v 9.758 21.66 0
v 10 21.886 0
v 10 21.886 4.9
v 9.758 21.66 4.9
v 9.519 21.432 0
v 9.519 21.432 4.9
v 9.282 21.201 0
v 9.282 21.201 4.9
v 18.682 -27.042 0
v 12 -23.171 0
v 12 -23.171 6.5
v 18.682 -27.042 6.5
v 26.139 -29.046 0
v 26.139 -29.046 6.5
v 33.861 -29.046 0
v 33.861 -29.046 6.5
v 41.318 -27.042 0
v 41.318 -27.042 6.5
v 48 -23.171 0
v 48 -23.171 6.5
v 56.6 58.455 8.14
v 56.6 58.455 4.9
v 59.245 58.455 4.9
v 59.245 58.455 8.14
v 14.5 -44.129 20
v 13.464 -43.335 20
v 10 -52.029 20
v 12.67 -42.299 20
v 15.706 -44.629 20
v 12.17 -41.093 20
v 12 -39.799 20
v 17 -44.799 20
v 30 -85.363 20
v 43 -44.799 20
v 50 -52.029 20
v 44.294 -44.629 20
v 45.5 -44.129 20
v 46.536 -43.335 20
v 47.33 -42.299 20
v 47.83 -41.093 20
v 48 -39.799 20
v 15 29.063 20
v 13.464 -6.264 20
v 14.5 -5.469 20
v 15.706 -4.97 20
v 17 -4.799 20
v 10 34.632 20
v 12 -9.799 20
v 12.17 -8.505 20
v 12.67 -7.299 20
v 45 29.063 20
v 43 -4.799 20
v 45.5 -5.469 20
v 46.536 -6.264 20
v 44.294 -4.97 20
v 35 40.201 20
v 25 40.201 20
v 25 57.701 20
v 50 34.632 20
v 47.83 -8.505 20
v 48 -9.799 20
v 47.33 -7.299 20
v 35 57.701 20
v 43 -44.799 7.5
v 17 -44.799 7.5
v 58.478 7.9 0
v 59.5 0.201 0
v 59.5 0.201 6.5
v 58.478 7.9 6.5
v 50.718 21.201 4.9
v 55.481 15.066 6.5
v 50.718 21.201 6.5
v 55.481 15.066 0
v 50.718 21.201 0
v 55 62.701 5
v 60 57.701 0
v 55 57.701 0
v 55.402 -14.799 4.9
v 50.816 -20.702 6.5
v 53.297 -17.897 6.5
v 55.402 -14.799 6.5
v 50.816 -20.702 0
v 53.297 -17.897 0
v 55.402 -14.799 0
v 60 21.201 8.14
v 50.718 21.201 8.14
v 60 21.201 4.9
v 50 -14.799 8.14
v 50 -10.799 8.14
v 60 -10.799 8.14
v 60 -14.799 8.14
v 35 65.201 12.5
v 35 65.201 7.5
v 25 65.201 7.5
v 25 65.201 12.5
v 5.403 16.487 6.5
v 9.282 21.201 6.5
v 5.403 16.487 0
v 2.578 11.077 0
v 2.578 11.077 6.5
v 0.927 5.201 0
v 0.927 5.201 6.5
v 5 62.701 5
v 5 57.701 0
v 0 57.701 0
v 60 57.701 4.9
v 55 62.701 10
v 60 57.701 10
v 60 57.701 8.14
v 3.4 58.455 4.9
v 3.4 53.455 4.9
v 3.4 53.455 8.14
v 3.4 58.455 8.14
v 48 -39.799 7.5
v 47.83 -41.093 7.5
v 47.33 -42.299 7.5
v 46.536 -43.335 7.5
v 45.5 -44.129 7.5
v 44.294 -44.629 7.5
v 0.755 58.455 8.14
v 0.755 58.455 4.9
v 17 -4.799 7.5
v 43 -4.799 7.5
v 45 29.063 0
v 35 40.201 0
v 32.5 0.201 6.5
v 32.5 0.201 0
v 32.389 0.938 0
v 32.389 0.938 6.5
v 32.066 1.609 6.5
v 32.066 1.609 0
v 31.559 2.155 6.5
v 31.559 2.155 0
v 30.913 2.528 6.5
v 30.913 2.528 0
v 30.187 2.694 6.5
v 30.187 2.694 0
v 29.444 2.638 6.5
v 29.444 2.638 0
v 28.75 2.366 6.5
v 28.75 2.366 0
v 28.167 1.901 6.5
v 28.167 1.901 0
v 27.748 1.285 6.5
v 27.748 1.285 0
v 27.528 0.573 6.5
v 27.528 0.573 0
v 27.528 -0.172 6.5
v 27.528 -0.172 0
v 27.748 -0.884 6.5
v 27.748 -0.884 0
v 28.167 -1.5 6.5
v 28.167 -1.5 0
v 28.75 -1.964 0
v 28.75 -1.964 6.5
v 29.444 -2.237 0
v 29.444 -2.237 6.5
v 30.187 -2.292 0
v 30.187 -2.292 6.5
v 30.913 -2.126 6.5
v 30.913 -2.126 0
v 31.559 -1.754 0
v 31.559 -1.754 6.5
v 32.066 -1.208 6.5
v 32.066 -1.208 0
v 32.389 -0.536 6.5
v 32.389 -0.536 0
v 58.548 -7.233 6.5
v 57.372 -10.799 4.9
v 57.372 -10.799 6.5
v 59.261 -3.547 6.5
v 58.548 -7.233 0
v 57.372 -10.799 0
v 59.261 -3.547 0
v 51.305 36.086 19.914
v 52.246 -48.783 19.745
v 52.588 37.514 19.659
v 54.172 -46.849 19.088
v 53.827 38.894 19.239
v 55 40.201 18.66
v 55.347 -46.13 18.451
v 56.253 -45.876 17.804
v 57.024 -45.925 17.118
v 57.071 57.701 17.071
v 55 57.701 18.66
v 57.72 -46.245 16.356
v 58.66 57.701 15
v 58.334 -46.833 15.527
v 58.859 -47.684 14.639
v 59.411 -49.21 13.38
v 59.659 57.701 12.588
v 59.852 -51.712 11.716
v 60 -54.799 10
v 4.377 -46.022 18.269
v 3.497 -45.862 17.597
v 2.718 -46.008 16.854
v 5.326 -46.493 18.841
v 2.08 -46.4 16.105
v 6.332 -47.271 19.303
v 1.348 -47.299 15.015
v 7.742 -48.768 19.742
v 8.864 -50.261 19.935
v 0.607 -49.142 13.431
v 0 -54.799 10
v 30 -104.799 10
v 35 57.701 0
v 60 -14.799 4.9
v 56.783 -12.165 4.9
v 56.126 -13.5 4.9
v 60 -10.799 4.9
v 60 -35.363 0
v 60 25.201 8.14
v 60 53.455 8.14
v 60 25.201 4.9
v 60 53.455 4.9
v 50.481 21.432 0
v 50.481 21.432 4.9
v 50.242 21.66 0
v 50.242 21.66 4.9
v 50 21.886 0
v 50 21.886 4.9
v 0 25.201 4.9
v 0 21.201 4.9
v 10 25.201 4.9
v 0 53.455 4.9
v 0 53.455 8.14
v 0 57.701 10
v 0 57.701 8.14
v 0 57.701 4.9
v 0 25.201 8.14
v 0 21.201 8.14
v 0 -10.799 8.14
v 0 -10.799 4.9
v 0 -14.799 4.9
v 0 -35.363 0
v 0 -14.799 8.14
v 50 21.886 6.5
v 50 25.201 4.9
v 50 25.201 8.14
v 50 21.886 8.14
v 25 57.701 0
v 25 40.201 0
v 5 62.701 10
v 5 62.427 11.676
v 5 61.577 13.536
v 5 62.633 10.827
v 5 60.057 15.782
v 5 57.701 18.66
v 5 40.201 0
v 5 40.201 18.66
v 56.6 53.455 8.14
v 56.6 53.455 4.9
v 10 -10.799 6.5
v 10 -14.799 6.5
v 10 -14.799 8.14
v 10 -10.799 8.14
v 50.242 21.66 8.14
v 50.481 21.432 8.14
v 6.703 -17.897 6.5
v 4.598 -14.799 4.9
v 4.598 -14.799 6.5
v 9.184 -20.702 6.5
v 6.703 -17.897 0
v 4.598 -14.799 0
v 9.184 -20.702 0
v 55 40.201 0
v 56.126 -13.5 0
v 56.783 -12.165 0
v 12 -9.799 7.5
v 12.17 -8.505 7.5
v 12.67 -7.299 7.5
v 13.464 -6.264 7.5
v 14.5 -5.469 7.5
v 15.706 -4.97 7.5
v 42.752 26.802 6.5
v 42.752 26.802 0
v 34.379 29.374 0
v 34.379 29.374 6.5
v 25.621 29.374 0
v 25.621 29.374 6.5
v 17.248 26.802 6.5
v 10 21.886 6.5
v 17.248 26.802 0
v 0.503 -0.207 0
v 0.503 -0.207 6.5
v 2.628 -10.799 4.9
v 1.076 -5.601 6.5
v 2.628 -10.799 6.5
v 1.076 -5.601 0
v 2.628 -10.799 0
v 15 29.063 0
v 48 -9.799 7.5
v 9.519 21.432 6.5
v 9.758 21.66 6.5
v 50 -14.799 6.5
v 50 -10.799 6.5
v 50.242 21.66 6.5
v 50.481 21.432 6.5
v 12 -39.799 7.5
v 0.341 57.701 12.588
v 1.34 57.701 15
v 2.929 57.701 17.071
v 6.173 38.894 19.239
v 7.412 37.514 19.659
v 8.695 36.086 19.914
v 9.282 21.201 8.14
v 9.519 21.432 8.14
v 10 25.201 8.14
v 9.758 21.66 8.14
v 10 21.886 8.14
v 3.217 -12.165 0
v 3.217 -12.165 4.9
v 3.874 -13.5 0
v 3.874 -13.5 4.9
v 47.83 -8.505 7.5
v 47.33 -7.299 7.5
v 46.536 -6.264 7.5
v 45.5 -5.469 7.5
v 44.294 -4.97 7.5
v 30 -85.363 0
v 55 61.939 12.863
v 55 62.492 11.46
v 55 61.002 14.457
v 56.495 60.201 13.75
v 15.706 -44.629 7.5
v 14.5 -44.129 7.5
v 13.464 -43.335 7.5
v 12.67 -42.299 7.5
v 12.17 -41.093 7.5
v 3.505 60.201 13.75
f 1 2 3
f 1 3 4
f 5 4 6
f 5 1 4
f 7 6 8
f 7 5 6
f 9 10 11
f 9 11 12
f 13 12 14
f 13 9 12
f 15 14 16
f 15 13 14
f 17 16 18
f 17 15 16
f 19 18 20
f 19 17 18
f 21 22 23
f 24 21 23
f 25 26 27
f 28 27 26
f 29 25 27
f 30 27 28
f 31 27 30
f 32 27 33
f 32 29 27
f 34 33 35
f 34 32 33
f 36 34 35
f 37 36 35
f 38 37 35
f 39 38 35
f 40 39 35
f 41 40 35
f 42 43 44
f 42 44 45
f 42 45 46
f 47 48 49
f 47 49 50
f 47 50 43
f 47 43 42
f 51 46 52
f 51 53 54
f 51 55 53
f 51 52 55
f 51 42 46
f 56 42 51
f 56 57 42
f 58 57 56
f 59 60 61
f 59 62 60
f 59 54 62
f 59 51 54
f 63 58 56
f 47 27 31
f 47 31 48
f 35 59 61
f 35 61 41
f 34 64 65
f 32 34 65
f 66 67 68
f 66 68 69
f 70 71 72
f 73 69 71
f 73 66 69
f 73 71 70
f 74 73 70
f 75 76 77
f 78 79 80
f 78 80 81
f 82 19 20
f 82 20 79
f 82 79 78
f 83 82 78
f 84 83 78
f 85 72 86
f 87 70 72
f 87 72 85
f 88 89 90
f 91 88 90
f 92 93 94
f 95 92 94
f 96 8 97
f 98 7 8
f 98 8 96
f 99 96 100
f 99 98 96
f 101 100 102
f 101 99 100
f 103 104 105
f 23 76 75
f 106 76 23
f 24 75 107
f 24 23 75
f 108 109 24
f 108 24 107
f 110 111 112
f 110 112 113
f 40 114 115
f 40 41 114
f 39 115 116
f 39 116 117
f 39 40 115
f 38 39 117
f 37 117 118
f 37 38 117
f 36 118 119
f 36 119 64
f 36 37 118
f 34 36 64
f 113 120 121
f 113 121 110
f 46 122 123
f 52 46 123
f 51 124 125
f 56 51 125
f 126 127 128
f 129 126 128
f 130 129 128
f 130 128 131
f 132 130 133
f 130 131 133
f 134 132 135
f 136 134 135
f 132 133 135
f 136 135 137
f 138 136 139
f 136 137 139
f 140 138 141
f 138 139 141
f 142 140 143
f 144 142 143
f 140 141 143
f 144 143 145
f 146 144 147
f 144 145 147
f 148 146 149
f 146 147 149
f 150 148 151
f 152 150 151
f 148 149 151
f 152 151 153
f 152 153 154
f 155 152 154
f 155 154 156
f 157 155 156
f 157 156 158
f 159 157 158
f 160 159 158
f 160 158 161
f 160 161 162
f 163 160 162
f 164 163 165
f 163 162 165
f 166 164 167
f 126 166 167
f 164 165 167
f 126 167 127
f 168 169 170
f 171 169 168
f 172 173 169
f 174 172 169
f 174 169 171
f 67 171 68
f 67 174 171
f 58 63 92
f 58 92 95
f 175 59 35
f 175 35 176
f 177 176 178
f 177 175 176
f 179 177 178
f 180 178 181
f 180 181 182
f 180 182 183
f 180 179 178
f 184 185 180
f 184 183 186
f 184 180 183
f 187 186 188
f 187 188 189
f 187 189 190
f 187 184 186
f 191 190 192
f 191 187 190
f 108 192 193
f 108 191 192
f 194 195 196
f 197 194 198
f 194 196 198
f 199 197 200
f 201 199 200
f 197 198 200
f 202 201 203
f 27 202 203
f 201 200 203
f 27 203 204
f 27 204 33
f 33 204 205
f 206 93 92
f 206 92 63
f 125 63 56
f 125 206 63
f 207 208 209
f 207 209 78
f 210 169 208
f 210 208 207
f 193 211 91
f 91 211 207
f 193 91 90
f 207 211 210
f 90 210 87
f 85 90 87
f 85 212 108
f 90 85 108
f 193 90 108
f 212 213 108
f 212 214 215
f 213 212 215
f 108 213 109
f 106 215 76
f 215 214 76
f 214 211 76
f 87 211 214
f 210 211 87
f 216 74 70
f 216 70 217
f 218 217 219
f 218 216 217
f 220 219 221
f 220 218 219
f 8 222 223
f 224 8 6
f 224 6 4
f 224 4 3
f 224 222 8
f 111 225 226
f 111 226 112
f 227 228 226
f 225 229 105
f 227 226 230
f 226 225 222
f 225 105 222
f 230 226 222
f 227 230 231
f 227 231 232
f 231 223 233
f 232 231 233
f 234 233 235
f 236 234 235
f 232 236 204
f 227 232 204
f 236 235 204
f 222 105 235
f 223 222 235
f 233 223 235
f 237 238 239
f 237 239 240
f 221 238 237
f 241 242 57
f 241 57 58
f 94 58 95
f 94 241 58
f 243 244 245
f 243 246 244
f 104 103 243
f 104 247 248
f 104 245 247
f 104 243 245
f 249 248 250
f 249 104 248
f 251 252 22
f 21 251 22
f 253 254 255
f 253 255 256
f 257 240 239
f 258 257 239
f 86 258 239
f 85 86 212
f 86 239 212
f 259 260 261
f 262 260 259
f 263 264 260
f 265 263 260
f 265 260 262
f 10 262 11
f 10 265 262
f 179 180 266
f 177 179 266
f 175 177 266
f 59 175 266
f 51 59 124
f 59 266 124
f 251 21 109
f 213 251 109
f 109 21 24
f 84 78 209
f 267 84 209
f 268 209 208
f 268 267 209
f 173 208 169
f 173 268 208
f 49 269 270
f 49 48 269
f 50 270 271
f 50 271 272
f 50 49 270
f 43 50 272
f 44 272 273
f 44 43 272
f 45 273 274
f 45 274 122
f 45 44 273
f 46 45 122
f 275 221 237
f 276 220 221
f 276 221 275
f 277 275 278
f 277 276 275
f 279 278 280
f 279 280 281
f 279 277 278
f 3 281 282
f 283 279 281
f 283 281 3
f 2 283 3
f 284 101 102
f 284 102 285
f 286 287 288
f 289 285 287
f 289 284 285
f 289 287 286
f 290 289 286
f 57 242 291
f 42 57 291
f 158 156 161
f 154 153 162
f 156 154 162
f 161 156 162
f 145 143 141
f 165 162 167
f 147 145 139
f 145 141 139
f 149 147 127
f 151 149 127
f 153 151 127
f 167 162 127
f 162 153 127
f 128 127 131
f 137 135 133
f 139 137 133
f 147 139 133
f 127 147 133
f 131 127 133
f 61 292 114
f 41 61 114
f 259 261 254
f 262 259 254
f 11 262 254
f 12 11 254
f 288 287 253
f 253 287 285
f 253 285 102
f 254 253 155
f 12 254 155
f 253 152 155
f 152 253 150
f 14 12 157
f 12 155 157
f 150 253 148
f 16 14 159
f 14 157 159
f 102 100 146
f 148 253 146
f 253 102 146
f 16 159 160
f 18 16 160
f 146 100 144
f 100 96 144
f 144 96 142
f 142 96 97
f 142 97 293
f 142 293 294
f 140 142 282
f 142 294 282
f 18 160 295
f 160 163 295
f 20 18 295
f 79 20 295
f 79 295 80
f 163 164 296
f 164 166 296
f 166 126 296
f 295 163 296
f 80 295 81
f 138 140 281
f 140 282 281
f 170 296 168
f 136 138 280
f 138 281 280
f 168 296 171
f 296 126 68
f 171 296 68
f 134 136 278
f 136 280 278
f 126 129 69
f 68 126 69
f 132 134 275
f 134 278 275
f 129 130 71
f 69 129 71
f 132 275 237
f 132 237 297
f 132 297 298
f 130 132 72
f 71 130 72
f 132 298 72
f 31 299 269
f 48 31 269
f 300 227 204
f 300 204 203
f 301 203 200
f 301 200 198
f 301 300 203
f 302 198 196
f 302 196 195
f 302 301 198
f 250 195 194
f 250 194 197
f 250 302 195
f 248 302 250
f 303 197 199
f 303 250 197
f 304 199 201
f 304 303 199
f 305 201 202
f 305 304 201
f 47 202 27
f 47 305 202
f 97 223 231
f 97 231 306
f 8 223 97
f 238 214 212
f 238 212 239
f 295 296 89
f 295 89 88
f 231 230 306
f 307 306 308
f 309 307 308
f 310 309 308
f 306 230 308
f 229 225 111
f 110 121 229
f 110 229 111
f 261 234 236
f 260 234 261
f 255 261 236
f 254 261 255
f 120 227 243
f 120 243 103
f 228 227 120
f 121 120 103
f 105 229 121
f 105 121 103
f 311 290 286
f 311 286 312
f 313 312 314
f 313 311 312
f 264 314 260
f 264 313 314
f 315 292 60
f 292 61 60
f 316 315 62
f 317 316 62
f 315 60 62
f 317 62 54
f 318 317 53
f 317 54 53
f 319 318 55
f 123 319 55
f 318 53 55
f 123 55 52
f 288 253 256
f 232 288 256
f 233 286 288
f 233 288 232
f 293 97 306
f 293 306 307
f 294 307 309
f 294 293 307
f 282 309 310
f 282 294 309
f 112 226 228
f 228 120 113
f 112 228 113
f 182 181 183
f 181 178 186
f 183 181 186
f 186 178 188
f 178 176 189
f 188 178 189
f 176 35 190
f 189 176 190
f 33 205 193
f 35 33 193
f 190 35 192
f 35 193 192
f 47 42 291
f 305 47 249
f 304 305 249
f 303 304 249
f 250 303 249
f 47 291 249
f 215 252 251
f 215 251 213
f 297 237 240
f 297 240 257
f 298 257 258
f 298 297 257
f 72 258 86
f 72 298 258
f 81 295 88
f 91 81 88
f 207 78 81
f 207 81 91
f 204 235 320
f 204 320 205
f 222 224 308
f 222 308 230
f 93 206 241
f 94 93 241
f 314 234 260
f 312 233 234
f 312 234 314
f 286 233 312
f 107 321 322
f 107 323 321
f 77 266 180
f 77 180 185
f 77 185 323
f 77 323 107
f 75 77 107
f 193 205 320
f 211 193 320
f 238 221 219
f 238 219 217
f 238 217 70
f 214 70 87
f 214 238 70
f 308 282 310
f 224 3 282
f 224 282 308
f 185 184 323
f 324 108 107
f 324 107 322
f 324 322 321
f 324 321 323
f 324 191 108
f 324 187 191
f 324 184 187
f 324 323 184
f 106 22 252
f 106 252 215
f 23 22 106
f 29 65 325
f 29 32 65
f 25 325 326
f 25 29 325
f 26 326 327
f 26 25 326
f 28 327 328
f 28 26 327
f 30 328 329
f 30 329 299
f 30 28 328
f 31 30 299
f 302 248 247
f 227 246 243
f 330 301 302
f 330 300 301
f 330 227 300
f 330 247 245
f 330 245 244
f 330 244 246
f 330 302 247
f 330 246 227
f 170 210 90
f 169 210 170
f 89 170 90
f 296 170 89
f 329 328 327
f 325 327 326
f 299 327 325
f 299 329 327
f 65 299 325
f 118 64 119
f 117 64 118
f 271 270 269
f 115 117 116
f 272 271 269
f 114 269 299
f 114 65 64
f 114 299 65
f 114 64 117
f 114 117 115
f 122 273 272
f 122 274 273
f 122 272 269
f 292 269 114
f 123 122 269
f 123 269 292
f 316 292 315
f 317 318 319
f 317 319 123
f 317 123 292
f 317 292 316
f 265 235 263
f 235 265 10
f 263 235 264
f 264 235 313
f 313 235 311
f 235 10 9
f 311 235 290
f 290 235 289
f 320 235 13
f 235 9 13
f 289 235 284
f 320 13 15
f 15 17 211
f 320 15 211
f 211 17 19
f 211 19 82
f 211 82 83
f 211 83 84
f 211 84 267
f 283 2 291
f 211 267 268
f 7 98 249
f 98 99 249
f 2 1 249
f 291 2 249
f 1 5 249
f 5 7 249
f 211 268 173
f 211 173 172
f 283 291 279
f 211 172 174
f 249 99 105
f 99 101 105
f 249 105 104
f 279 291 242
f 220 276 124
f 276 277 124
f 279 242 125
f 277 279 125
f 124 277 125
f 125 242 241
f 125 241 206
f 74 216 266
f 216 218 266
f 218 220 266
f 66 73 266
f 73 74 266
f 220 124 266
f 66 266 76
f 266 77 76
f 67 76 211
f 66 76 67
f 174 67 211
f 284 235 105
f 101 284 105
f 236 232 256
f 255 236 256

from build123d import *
from build123d import SkipClean  # not in build123d's __all__

# Parameters (mm, degrees)
F0_W        = 2.5
F0_H        = 10
F0_R        = 2.5
F0_W_2      = 3.4
F0_H_2      = 5
F1_DEPTH    = 20
F2_DEPTH    = 7.5
F3_DEPTH    = 6.5
F4_R        = 5
F5_SIZE     = 10
F6_SIZE     = 9.99999
F7_T1_DEPTH = 150.5634936838
F8_SIZE     = 7.5
F9_DEPTH    = 20
F10_START   = 4.9
F10_DEPTH   = 3.24


# Not quite as in the source:
# - a fillet or chamfer that OpenCascade refuses, or shapes differently, is made with other operations: its cross-section is extruded or revolved along the edge and cut away or added
# - a fillet or chamfer is up to 0.001 mm smaller than in the source, because OpenCascade refuses the exact size


with BuildPart() as f1:
    # F0 (on Top) → F1 (new body)
    with BuildSketch(Plane.XY):
        with BuildLine():
            Line((60, 21.2007117721), (50.7183493551, 21.2007117721))
            ThreePointArc((50.7183493551, 21.2007117721), (57.2161836595, 11.5818078095), (59.5, 0.2007117721))
            ThreePointArc((59.5, 0.2007117721), (58.9632243189, -5.4012197743), (57.3724313863, -10.7992882279))
            Line((57.3724313863, -10.7992882279), (60, -10.7992882279))
            Line((60, -10.7992882279), (60, 21.2007117721))
        make_face()
        with BuildLine():
            Line((9.2816506449, 21.2007117721), (0, 21.2007117721))
            Line((0, 21.2007117721), (0, 5.2007117721))
            Line((0, 5.2007117721), (0.9268164798, 5.2007117721))
            ThreePointArc((0.9268164798, 5.2007117721), (3.8504457683, 13.8554110907), (9.2816506449, 21.2007117721))
        make_face()
        with BuildLine():
            Line((2.6275686137, -10.7992882279), (0, -10.7992882279))
            Line((0, -10.7992882279), (0, -14.7992882279))
            Line((0, -14.7992882279), (4.5982284082, -14.7992882279))
            ThreePointArc((4.5982284082, -14.7992882279), (3.5372124485, -12.8365760979), (2.6275686137, -10.7992882279))
        make_face()
        with Locations((46.75, 60.2007117721)):
            Rectangle(F0_W, F0_H)
        with Locations((13.25, 60.2007117721)):
            Rectangle(F0_W, F0_H)
        Polygon((30, -54.7992882279), (30, -104.7992882279), (60, -54.7992882279), (48, -54.7992882279), (43, -54.7992882279), align=None)
        Polygon((12, -54.7992882279), (0, -54.7992882279), (30, -104.7992882279), (30, -54.7992882279), align=None)
        with BuildLine():
            Line((10, 21.2007117721), (9.2816506449, 21.2007117721))
            ThreePointArc((9.2816506449, 21.2007117721), (3.8504457683, 13.8554110907), (0.9268164798, 5.2007117721))
            ThreePointArc((0.9268164798, 5.2007117721), (0.6652618804, -2.9174831312), (2.6275686137, -10.7992882279))
            Line((2.6275686137, -10.7992882279), (10, -10.7992882279))
            Line((10, -10.7992882279), (10, -14.7992882279))
            Line((10, -14.7992882279), (4.5982284082, -14.7992882279))
            ThreePointArc((4.5982284082, -14.7992882279), (7.8990722833, -19.3389656577), (12, -23.1712800129))
            Line((12, -23.1712800129), (12, -4.7992882279))
            Line((12, -4.7992882279), (48, -4.7992882279))
            Line((48, -4.7992882279), (48, -23.1712800129))
            ThreePointArc((48, -23.1712800129), (52.1009277167, -19.3389656577), (55.4017715918, -14.7992882279))
            Line((55.4017715918, -14.7992882279), (50, -14.7992882279))
            Line((50, -14.7992882279), (50, -10.7992882279))
            Line((50, -10.7992882279), (57.3724313863, -10.7992882279))
            ThreePointArc((57.3724313863, -10.7992882279), (58.9632243189, -5.4012197743), (59.5, 0.2007117721))
            ThreePointArc((59.5, 0.2007117721), (57.2161836595, 11.5818078095), (50.7183493551, 21.2007117721))
            Line((50.7183493551, 21.2007117721), (50, 21.2007117721))
            Line((50, 21.2007117721), (50, 21.8859602143))
            ThreePointArc((50, 21.8859602143), (30, 29.7007117721), (10, 21.8859602143))
            Line((10, 21.8859602143), (10, 21.2007117721))
        make_face()
        with Locations((30, 0.2007117721)):
            Circle(F0_R, mode=Mode.SUBTRACT)
        with Locations((30, 0.2007117721)):
            Circle(F0_R)
        Polygon((12, 65.2007117721), (5, 65.2007117721), (5, 40.2007117721), (25, 40.2007117721), (25, 65.2007117721), (14.5, 65.2007117721), (14.5, 55.2007117721), (12, 55.2007117721), align=None)
        Polygon((45.5, 65.2007117721), (35, 65.2007117721), (35, 40.2007117721), (55, 40.2007117721), (55, 65.2007117721), (48, 65.2007117721), (48, 55.2007117721), (45.5, 55.2007117721), align=None)
        Polygon((12, -44.7992882279), (12, -54.7992882279), (30, -54.7992882279), (43, -54.7992882279), (48, -54.7992882279), (48, -44.7992882279), align=None)
        with BuildLine():
            Line((10, 25.2007117721), (0, 25.2007117721))
            Line((0, 25.2007117721), (0, 21.2007117721))
            Line((0, 21.2007117721), (9.2816506449, 21.2007117721))
            ThreePointArc((9.2816506449, 21.2007117721), (9.6379425178, 21.5463580517), (10, 21.8859602143))
            Line((10, 21.8859602143), (10, 25.2007117721))
        make_face()
        with BuildLine():
            Line((4.5982284082, -14.7992882279), (0, -14.7992882279))
            Line((0, -14.7992882279), (0, -49.7992882279))
            Line((0, -49.7992882279), (0, -54.7992882279))
            Line((0, -54.7992882279), (12, -54.7992882279))
            Line((12, -54.7992882279), (12, -44.7992882279))
            Line((12, -44.7992882279), (12, -23.1712800129))
            ThreePointArc((12, -23.1712800129), (7.8990722833, -19.3389656577), (4.5982284082, -14.7992882279))
        make_face()
        with BuildLine():
            Line((10, -10.7992882279), (2.6275686137, -10.7992882279))
            ThreePointArc((2.6275686137, -10.7992882279), (3.5372124485, -12.8365760979), (4.5982284082, -14.7992882279))
            Line((4.5982284082, -14.7992882279), (10, -14.7992882279))
            Line((10, -14.7992882279), (10, -10.7992882279))
        make_face()
        with BuildLine():
            Line((0.9268164798, 5.2007117721), (0, 5.2007117721))
            Line((0, 5.2007117721), (0, -10.7992882279))
            Line((0, -10.7992882279), (2.6275686137, -10.7992882279))
            ThreePointArc((2.6275686137, -10.7992882279), (0.6652618804, -2.9174831312), (0.9268164798, 5.2007117721))
        make_face()
        with BuildLine():
            ThreePointArc((55.4017715918, -14.7992882279), (52.1009277167, -19.3389656577), (48, -23.1712800129))
            Line((48, -23.1712800129), (48, -44.7992882279))
            Line((48, -44.7992882279), (48, -54.7992882279))
            Line((48, -54.7992882279), (60, -54.7992882279))
            Line((60, -54.7992882279), (60, -14.7992882279))
            Line((60, -14.7992882279), (55.4017715918, -14.7992882279))
        make_face()
        with BuildLine():
            Line((5, 65.2007117721), (0, 65.2007117721))
            Line((0, 65.2007117721), (0, 58.455427289))
            Line((0, 58.455427289), (3.4, 58.455427289))
            Line((3.4, 58.455427289), (3.4, 53.455427289))
            Line((3.4, 53.455427289), (0, 53.455427289))
            Line((0, 53.455427289), (0, 25.2007117721))
            Line((0, 25.2007117721), (10, 25.2007117721))
            Line((10, 25.2007117721), (10, 21.8859602143))
            ThreePointArc((10, 21.8859602143), (30, 29.7007117721), (50, 21.8859602143))
            Line((50, 21.8859602143), (50, 25.2007117721))
            Line((50, 25.2007117721), (60, 25.2007117721))
            Line((60, 25.2007117721), (60, 53.455427289))
            Line((60, 53.455427289), (56.6, 53.455427289))
            Line((56.6, 53.455427289), (56.6, 58.455427289))
            Line((56.6, 58.455427289), (60, 58.455427289))
            Line((60, 58.455427289), (60, 65.2007117721))
            Line((60, 65.2007117721), (55, 65.2007117721))
            Line((55, 65.2007117721), (55, 40.2007117721))
            Line((55, 40.2007117721), (45, 29.0628469233))
            Line((45, 29.0628469233), (35, 40.2007117721))
            Line((35, 40.2007117721), (35, 65.2007117721))
            Line((35, 65.2007117721), (30, 65.2007117721))
            Line((30, 65.2007117721), (25, 65.2007117721))
            Line((25, 65.2007117721), (25, 40.2007117721))
            Line((25, 40.2007117721), (15, 29.0628469233))
            Line((15, 29.0628469233), (5, 40.2007117721))
            Line((5, 40.2007117721), (5, 65.2007117721))
        make_face()
        with BuildLine():
            Line((50, 25.2007117721), (50, 21.8859602143))
            ThreePointArc((50, 21.8859602143), (50.3620574822, 21.5463580517), (50.7183493551, 21.2007117721))
            Line((50.7183493551, 21.2007117721), (60, 21.2007117721))
            Line((60, 21.2007117721), (60, 25.2007117721))
            Line((60, 25.2007117721), (50, 25.2007117721))
        make_face()
        with BuildLine():
            Line((60, -10.7992882279), (57.3724313863, -10.7992882279))
            ThreePointArc((57.3724313863, -10.7992882279), (56.4627875515, -12.8365760979), (55.4017715918, -14.7992882279))
            Line((55.4017715918, -14.7992882279), (60, -14.7992882279))
            Line((60, -14.7992882279), (60, -10.7992882279))
        make_face()
        with BuildLine():
            ThreePointArc((55.4017715918, -14.7992882279), (56.4627875515, -12.8365760979), (57.3724313863, -10.7992882279))
            Line((57.3724313863, -10.7992882279), (50, -10.7992882279))
            Line((50, -10.7992882279), (50, -14.7992882279))
            Line((50, -14.7992882279), (55.4017715918, -14.7992882279))
        make_face()
        with BuildLine():
            ThreePointArc((10, 21.8859602143), (9.6379425178, 21.5463580517), (9.2816506449, 21.2007117721))
            Line((9.2816506449, 21.2007117721), (10, 21.2007117721))
            Line((10, 21.2007117721), (10, 21.8859602143))
        make_face()
        with BuildLine():
            ThreePointArc((50.7183493551, 21.2007117721), (50.3620574822, 21.5463580517), (50, 21.8859602143))
            Line((50, 21.8859602143), (50, 21.2007117721))
            Line((50, 21.2007117721), (50.7183493551, 21.2007117721))
        make_face()
        with Locations((1.7, 55.955427289)):
            Rectangle(F0_W_2, F0_H_2)
        with Locations((58.3, 55.955427289)):
            Rectangle(F0_W_2, F0_H_2)
    extrude(amount=F1_DEPTH)

    # F0 (on Top) → F2 (join)
    with BuildSketch(Plane.XY):
        with BuildLine():
            Line((12, -4.7992882279), (12, -23.1712800129))
            ThreePointArc((12, -23.1712800129), (30, -29.2992882279), (48, -23.1712800129))
            Line((48, -23.1712800129), (48, -4.7992882279))
            Line((48, -4.7992882279), (12, -4.7992882279))
        make_face()
        with BuildLine():
            ThreePointArc((48, -23.1712800129), (30, -29.2992882279), (12, -23.1712800129))
            Line((12, -23.1712800129), (12, -44.7992882279))
            Line((12, -44.7992882279), (48, -44.7992882279))
            Line((48, -44.7992882279), (48, -23.1712800129))
        make_face()
    extrude(amount=F2_DEPTH)

    # F0 (on Top) → F3 (cut)
    with BuildSketch(Plane.XY):
        with BuildLine():
            Line((12, -4.7992882279), (12, -23.1712800129))
            ThreePointArc((12, -23.1712800129), (30, -29.2992882279), (48, -23.1712800129))
            Line((48, -23.1712800129), (48, -4.7992882279))
            Line((48, -4.7992882279), (12, -4.7992882279))
        make_face()
        with BuildLine():
            Line((10, 21.2007117721), (9.2816506449, 21.2007117721))
            ThreePointArc((9.2816506449, 21.2007117721), (3.8504457683, 13.8554110907), (0.9268164798, 5.2007117721))
            ThreePointArc((0.9268164798, 5.2007117721), (0.6652618804, -2.9174831312), (2.6275686137, -10.7992882279))
            Line((2.6275686137, -10.7992882279), (10, -10.7992882279))
            Line((10, -10.7992882279), (10, -14.7992882279))
            Line((10, -14.7992882279), (4.5982284082, -14.7992882279))
            ThreePointArc((4.5982284082, -14.7992882279), (7.8990722833, -19.3389656577), (12, -23.1712800129))
            Line((12, -23.1712800129), (12, -4.7992882279))
            Line((12, -4.7992882279), (48, -4.7992882279))
            Line((48, -4.7992882279), (48, -23.1712800129))
            ThreePointArc((48, -23.1712800129), (52.1009277167, -19.3389656577), (55.4017715918, -14.7992882279))
            Line((55.4017715918, -14.7992882279), (50, -14.7992882279))
            Line((50, -14.7992882279), (50, -10.7992882279))
            Line((50, -10.7992882279), (57.3724313863, -10.7992882279))
            ThreePointArc((57.3724313863, -10.7992882279), (58.9632243189, -5.4012197743), (59.5, 0.2007117721))
            ThreePointArc((59.5, 0.2007117721), (57.2161836595, 11.5818078095), (50.7183493551, 21.2007117721))
            Line((50.7183493551, 21.2007117721), (50, 21.2007117721))
            Line((50, 21.2007117721), (50, 21.8859602143))
            ThreePointArc((50, 21.8859602143), (30, 29.7007117721), (10, 21.8859602143))
            Line((10, 21.8859602143), (10, 21.2007117721))
        make_face()
        with Locations((30, 0.2007117721)):
            Circle(F0_R, mode=Mode.SUBTRACT)
        with BuildLine():
            Line((10, -10.7992882279), (2.6275686137, -10.7992882279))
            ThreePointArc((2.6275686137, -10.7992882279), (3.5372124485, -12.8365760979), (4.5982284082, -14.7992882279))
            Line((4.5982284082, -14.7992882279), (10, -14.7992882279))
            Line((10, -14.7992882279), (10, -10.7992882279))
        make_face()
        with BuildLine():
            ThreePointArc((55.4017715918, -14.7992882279), (56.4627875515, -12.8365760979), (57.3724313863, -10.7992882279))
            Line((57.3724313863, -10.7992882279), (50, -10.7992882279))
            Line((50, -10.7992882279), (50, -14.7992882279))
            Line((50, -14.7992882279), (55.4017715918, -14.7992882279))
        make_face()
        with BuildLine():
            ThreePointArc((10, 21.8859602143), (9.6379425178, 21.5463580517), (9.2816506449, 21.2007117721))
            Line((9.2816506449, 21.2007117721), (10, 21.2007117721))
            Line((10, 21.2007117721), (10, 21.8859602143))
        make_face()
        with BuildLine():
            ThreePointArc((50.7183493551, 21.2007117721), (50.3620574822, 21.5463580517), (50, 21.8859602143))
            Line((50, 21.8859602143), (50, 21.2007117721))
            Line((50, 21.2007117721), (50.7183493551, 21.2007117721))
        make_face()
    extrude(amount=F3_DEPTH, mode=Mode.SUBTRACT)

    # F4
    f4_edges = [f1.edges().sort_by_distance(p)[0] for p in [
        (48, -4.799288, 13.75),
        (12, -4.799288, 13.75),
        (12, -44.799288, 13.75),
        (48, -44.799288, 13.75),
    ]]
    fillet(f4_edges, radius=F4_R)

    # F5
    f5_edges = [f1.edges().sort_by_distance(p)[0] for p in [
        (15, -79.799288, 20),
        (45, -79.799288, 20),
    ]]
    chamfer(f5_edges, length=F5_SIZE)

    # F6 (size 10 in the source; OpenCascade refuses exactly that, so slightly less here)
    f6_edges = [f1.edges().sort_by_distance(p)[0] for p in [
        (45, -79.799288, 0),
        (15, -79.799288, 0),
    ]]
    chamfer(f6_edges, length=F6_SIZE)

    # F7: fillet of radius 10 on 2 edges, made by hand

    # F7_s2 → F7_t1 (cut)
    with BuildSketch(Plane.XZ.offset(-90.2007117721)):
        with BuildLine():
            ThreePointArc((50, 20), (57.0710678119, 17.0710678119), (60, 10))
            Line((60, 10), (60, 20))
            Line((60, 20), (50, 20))
        make_face()
        with BuildLine():
            ThreePointArc((0, 10), (2.9289321881, 17.0710678119), (10, 20))
            Line((10, 20), (0, 20))
            Line((0, 20), (0, 10))
        make_face()
    extrude(amount=F7_T1_DEPTH, mode=Mode.SUBTRACT)

    # F8
    f8_edges = [f1.edges().sort_by_distance(p)[0] for p in [
        (30, 65.200712, 20),
        (30, 65.200712, 0),
    ]]
    chamfer(f8_edges, length=F8_SIZE)

    # F0 (on Top) → F9 (cut)
    with BuildSketch(Plane.XY):
        Polygon((12, 65.2007117721), (5, 65.2007117721), (5, 40.2007117721), (25, 40.2007117721), (25, 65.2007117721), (14.5, 65.2007117721), (14.5, 55.2007117721), (12, 55.2007117721), align=None)
        with Locations((13.25, 70.2007117721)):
            Rectangle(F0_W, F0_H)
        with Locations((13.25, 60.2007117721)):
            Rectangle(F0_W, F0_H)
        Polygon((45.5, 65.2007117721), (35, 65.2007117721), (35, 40.2007117721), (55, 40.2007117721), (55, 65.2007117721), (48, 65.2007117721), (48, 55.2007117721), (45.5, 55.2007117721), align=None)
        with Locations((46.75, 60.2007117721)):
            Rectangle(F0_W, F0_H)
        with Locations((46.75, 70.2007117721)):
            Rectangle(F0_W, F0_H)
    with SkipClean():  # cleaning this boolean's faces spoils the solid; the shape is the same uncleaned
        extrude(amount=F9_DEPTH, mode=Mode.SUBTRACT)

    # F0 (on Top) → F10 (cut)
    with BuildSketch(Plane.XY.offset(F10_START)):
        with BuildLine():
            Line((10, 25.2007117721), (0, 25.2007117721))
            Line((0, 25.2007117721), (0, 21.2007117721))
            Line((0, 21.2007117721), (9.2816506449, 21.2007117721))
            ThreePointArc((9.2816506449, 21.2007117721), (9.6379425178, 21.5463580517), (10, 21.8859602143))
            Line((10, 21.8859602143), (10, 25.2007117721))
        make_face()
        with BuildLine():
            Line((50, 25.2007117721), (50, 21.8859602143))
            ThreePointArc((50, 21.8859602143), (50.3620574822, 21.5463580517), (50.7183493551, 21.2007117721))
            Line((50.7183493551, 21.2007117721), (60, 21.2007117721))
            Line((60, 21.2007117721), (60, 25.2007117721))
            Line((60, 25.2007117721), (50, 25.2007117721))
        make_face()
        with BuildLine():
            Line((10, -10.7992882279), (2.6275686137, -10.7992882279))
            ThreePointArc((2.6275686137, -10.7992882279), (3.5372124485, -12.8365760979), (4.5982284082, -14.7992882279))
            Line((4.5982284082, -14.7992882279), (10, -14.7992882279))
            Line((10, -14.7992882279), (10, -10.7992882279))
        make_face()
        with BuildLine():
            Line((2.6275686137, -10.7992882279), (0, -10.7992882279))
            Line((0, -10.7992882279), (0, -14.7992882279))
            Line((0, -14.7992882279), (4.5982284082, -14.7992882279))
            ThreePointArc((4.5982284082, -14.7992882279), (3.5372124485, -12.8365760979), (2.6275686137, -10.7992882279))
        make_face()
        with BuildLine():
            ThreePointArc((55.4017715918, -14.7992882279), (56.4627875515, -12.8365760979), (57.3724313863, -10.7992882279))
            Line((57.3724313863, -10.7992882279), (50, -10.7992882279))
            Line((50, -10.7992882279), (50, -14.7992882279))
            Line((50, -14.7992882279), (55.4017715918, -14.7992882279))
        make_face()
        with BuildLine():
            Line((60, -10.7992882279), (57.3724313863, -10.7992882279))
            ThreePointArc((57.3724313863, -10.7992882279), (56.4627875515, -12.8365760979), (55.4017715918, -14.7992882279))
            Line((55.4017715918, -14.7992882279), (60, -14.7992882279))
            Line((60, -14.7992882279), (60, -10.7992882279))
        make_face()
        with Locations((58.3, 55.955427289)):
            Rectangle(F0_W_2, F0_H_2)
        with Locations((1.7, 55.955427289)):
            Rectangle(F0_W_2, F0_H_2)
    with SkipClean():  # cleaning this boolean's faces spoils the solid; the shape is the same uncleaned
        extrude(amount=F10_DEPTH, mode=Mode.SUBTRACT)


solid = f1.part
